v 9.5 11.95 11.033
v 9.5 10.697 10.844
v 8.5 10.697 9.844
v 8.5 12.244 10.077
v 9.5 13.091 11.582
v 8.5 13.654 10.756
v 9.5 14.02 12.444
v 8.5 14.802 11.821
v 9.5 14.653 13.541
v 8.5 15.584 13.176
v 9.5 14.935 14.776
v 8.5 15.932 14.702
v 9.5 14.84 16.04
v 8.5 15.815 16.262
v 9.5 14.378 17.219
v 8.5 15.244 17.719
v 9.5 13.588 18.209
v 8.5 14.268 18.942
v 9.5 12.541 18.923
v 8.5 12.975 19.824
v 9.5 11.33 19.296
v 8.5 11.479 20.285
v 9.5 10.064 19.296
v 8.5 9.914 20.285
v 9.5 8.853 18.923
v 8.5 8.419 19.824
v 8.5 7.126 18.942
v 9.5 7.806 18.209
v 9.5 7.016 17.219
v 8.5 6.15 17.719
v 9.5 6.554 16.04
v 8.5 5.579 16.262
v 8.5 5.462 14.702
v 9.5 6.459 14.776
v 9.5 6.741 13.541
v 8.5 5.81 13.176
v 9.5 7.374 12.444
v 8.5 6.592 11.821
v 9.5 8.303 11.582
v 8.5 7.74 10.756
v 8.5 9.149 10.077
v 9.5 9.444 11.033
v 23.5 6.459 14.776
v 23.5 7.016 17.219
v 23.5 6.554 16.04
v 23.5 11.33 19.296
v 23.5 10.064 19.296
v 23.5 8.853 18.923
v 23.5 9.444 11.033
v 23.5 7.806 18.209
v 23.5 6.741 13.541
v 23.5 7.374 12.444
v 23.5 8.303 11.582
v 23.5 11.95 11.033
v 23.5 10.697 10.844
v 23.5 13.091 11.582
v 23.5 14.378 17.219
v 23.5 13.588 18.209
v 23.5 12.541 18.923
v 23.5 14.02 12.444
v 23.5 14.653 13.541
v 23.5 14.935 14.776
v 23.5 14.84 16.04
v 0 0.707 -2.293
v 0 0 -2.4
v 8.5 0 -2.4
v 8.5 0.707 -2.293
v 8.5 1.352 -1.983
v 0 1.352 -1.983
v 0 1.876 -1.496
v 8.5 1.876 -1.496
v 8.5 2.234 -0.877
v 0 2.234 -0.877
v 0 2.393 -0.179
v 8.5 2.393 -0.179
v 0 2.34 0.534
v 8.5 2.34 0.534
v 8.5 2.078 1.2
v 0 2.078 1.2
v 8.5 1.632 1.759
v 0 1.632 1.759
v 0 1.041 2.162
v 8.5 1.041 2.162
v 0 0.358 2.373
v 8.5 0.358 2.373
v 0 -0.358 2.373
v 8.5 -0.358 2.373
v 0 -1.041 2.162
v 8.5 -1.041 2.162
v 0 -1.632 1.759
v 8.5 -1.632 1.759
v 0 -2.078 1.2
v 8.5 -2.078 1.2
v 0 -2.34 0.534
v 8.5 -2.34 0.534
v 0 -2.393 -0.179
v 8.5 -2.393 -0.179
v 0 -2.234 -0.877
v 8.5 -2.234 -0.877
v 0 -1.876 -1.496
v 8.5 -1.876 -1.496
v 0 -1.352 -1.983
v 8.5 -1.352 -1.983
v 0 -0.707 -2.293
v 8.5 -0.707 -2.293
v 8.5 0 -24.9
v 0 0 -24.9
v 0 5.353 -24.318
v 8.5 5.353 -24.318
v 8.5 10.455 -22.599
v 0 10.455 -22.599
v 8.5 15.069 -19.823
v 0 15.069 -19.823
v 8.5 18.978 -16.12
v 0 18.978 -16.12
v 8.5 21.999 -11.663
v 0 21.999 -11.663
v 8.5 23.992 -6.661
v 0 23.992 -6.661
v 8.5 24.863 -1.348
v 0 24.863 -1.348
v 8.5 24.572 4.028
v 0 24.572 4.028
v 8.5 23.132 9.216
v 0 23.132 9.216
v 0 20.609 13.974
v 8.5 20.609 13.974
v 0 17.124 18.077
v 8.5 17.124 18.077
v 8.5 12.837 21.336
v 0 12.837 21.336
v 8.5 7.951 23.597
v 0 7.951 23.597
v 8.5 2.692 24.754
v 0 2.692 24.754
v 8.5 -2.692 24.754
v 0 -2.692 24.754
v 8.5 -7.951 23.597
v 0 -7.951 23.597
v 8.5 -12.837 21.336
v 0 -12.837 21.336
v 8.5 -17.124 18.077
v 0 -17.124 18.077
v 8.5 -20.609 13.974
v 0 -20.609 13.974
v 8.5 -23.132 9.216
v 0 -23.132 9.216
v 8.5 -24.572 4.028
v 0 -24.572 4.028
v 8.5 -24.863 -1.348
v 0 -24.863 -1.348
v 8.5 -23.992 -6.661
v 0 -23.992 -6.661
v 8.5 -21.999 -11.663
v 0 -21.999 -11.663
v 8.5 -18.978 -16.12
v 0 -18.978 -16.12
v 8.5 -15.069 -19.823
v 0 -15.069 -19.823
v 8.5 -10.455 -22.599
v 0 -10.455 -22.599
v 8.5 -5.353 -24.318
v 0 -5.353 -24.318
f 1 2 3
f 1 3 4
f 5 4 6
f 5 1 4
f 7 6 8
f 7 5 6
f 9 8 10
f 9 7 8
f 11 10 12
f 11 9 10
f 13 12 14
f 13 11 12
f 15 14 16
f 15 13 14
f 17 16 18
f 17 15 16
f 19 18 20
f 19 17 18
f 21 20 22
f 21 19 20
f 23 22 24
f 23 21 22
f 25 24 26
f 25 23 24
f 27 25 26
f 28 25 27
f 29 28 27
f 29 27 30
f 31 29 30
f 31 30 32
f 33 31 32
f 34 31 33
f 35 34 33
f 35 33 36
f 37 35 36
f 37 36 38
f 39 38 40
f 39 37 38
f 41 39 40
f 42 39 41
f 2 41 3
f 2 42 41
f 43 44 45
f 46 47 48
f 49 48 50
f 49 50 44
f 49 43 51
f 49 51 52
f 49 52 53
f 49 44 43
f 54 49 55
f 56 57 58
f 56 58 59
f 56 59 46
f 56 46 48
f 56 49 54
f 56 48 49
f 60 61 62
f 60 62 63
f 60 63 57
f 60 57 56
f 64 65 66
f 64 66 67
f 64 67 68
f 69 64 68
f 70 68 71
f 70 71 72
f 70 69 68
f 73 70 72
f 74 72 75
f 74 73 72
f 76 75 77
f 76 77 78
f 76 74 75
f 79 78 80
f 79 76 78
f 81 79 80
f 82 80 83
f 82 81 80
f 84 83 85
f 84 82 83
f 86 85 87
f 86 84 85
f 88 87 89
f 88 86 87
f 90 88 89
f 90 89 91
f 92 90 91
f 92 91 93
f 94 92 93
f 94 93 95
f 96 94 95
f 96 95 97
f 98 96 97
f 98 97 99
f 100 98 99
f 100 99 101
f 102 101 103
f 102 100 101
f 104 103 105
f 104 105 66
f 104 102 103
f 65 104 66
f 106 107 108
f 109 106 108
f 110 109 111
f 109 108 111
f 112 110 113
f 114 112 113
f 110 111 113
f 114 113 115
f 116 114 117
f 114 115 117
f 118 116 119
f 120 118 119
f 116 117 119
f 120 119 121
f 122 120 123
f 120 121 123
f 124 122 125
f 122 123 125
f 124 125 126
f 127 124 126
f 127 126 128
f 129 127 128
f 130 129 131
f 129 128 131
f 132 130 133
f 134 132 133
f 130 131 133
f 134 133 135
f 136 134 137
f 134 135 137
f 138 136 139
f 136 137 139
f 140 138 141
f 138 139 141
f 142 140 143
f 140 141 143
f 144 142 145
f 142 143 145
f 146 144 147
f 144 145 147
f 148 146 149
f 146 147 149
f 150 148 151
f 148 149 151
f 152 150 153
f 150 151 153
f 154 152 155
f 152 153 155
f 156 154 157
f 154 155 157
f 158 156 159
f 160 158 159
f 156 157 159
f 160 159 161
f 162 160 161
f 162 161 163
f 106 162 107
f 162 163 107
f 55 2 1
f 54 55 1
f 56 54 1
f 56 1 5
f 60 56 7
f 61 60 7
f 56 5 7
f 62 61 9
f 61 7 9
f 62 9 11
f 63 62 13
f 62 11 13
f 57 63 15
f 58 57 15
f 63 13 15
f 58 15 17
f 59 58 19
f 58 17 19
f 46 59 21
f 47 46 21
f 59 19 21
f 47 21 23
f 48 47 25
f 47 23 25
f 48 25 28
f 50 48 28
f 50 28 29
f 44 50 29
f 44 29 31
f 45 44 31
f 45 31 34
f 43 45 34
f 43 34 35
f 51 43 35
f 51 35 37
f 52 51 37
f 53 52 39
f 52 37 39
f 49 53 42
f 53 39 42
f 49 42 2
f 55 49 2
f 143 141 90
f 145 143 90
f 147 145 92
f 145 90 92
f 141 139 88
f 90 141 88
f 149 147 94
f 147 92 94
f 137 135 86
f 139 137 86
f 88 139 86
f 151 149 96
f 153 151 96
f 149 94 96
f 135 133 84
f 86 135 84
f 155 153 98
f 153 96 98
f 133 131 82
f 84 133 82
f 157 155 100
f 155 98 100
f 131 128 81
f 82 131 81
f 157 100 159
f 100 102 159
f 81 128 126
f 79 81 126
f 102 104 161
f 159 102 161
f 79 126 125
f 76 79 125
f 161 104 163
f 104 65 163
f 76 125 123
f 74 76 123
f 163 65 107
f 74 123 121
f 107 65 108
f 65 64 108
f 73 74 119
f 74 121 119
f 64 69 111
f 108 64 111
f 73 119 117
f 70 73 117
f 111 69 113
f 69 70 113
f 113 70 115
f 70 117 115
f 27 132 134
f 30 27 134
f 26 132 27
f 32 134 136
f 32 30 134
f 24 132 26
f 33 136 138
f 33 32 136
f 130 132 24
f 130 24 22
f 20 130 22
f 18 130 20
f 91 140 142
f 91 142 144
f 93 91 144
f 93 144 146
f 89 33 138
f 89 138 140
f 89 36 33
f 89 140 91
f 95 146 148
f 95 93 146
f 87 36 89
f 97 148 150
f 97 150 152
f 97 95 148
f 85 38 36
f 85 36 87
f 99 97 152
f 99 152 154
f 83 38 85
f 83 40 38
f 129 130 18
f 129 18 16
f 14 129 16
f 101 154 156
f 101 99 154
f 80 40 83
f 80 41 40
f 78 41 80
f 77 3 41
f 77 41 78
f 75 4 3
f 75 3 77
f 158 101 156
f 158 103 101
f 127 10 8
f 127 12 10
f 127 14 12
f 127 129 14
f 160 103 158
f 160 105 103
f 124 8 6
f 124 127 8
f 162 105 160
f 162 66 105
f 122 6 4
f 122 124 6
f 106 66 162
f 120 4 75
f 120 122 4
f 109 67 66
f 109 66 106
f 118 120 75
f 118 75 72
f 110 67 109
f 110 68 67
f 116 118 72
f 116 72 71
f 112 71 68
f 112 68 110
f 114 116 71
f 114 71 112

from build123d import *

# Parameters (mm, degrees)
CROQUIS1_R              = 24.9
CROQUIS1_R_2            = 2.4
SALIENTE_EXTRUIR1_DEPTH = 8.5
CROQUIS2_R              = 4.25
SALIENTE_EXTRUIR2_DEPTH = 15
CHAFL_N1_SIZE           = 1


with BuildPart() as part:
    # Croquis1 → Saliente-Extruir1 (new body)
    with BuildSketch(Plane(origin=(0, 0, 0), x_dir=(0, 0, -1), z_dir=(1, 0, 0))):
        Circle(CROQUIS1_R)
        Circle(CROQUIS1_R_2, mode=Mode.SUBTRACT)
    extrude(amount=SALIENTE_EXTRUIR1_DEPTH)

    # Croquis2 → Saliente-Extruir2 (add)
    with BuildSketch(Plane(origin=(8.5, 0, 0), x_dir=(0, 0, -1), z_dir=(1, 0, 0))):
        with Locations((-15.09387296, 10.696962141)):
            Circle(CROQUIS2_R)
    extrude(amount=SALIENTE_EXTRUIR2_DEPTH)

    # Chaflán1
    chafl_n1_edges = [part.edges().sort_by_distance(p)[0] for p in [
        (8.5, 10.696962141, 19.34387296),
    ]]
    chamfer(chafl_n1_edges, length=CHAFL_N1_SIZE)


solid = part.part
